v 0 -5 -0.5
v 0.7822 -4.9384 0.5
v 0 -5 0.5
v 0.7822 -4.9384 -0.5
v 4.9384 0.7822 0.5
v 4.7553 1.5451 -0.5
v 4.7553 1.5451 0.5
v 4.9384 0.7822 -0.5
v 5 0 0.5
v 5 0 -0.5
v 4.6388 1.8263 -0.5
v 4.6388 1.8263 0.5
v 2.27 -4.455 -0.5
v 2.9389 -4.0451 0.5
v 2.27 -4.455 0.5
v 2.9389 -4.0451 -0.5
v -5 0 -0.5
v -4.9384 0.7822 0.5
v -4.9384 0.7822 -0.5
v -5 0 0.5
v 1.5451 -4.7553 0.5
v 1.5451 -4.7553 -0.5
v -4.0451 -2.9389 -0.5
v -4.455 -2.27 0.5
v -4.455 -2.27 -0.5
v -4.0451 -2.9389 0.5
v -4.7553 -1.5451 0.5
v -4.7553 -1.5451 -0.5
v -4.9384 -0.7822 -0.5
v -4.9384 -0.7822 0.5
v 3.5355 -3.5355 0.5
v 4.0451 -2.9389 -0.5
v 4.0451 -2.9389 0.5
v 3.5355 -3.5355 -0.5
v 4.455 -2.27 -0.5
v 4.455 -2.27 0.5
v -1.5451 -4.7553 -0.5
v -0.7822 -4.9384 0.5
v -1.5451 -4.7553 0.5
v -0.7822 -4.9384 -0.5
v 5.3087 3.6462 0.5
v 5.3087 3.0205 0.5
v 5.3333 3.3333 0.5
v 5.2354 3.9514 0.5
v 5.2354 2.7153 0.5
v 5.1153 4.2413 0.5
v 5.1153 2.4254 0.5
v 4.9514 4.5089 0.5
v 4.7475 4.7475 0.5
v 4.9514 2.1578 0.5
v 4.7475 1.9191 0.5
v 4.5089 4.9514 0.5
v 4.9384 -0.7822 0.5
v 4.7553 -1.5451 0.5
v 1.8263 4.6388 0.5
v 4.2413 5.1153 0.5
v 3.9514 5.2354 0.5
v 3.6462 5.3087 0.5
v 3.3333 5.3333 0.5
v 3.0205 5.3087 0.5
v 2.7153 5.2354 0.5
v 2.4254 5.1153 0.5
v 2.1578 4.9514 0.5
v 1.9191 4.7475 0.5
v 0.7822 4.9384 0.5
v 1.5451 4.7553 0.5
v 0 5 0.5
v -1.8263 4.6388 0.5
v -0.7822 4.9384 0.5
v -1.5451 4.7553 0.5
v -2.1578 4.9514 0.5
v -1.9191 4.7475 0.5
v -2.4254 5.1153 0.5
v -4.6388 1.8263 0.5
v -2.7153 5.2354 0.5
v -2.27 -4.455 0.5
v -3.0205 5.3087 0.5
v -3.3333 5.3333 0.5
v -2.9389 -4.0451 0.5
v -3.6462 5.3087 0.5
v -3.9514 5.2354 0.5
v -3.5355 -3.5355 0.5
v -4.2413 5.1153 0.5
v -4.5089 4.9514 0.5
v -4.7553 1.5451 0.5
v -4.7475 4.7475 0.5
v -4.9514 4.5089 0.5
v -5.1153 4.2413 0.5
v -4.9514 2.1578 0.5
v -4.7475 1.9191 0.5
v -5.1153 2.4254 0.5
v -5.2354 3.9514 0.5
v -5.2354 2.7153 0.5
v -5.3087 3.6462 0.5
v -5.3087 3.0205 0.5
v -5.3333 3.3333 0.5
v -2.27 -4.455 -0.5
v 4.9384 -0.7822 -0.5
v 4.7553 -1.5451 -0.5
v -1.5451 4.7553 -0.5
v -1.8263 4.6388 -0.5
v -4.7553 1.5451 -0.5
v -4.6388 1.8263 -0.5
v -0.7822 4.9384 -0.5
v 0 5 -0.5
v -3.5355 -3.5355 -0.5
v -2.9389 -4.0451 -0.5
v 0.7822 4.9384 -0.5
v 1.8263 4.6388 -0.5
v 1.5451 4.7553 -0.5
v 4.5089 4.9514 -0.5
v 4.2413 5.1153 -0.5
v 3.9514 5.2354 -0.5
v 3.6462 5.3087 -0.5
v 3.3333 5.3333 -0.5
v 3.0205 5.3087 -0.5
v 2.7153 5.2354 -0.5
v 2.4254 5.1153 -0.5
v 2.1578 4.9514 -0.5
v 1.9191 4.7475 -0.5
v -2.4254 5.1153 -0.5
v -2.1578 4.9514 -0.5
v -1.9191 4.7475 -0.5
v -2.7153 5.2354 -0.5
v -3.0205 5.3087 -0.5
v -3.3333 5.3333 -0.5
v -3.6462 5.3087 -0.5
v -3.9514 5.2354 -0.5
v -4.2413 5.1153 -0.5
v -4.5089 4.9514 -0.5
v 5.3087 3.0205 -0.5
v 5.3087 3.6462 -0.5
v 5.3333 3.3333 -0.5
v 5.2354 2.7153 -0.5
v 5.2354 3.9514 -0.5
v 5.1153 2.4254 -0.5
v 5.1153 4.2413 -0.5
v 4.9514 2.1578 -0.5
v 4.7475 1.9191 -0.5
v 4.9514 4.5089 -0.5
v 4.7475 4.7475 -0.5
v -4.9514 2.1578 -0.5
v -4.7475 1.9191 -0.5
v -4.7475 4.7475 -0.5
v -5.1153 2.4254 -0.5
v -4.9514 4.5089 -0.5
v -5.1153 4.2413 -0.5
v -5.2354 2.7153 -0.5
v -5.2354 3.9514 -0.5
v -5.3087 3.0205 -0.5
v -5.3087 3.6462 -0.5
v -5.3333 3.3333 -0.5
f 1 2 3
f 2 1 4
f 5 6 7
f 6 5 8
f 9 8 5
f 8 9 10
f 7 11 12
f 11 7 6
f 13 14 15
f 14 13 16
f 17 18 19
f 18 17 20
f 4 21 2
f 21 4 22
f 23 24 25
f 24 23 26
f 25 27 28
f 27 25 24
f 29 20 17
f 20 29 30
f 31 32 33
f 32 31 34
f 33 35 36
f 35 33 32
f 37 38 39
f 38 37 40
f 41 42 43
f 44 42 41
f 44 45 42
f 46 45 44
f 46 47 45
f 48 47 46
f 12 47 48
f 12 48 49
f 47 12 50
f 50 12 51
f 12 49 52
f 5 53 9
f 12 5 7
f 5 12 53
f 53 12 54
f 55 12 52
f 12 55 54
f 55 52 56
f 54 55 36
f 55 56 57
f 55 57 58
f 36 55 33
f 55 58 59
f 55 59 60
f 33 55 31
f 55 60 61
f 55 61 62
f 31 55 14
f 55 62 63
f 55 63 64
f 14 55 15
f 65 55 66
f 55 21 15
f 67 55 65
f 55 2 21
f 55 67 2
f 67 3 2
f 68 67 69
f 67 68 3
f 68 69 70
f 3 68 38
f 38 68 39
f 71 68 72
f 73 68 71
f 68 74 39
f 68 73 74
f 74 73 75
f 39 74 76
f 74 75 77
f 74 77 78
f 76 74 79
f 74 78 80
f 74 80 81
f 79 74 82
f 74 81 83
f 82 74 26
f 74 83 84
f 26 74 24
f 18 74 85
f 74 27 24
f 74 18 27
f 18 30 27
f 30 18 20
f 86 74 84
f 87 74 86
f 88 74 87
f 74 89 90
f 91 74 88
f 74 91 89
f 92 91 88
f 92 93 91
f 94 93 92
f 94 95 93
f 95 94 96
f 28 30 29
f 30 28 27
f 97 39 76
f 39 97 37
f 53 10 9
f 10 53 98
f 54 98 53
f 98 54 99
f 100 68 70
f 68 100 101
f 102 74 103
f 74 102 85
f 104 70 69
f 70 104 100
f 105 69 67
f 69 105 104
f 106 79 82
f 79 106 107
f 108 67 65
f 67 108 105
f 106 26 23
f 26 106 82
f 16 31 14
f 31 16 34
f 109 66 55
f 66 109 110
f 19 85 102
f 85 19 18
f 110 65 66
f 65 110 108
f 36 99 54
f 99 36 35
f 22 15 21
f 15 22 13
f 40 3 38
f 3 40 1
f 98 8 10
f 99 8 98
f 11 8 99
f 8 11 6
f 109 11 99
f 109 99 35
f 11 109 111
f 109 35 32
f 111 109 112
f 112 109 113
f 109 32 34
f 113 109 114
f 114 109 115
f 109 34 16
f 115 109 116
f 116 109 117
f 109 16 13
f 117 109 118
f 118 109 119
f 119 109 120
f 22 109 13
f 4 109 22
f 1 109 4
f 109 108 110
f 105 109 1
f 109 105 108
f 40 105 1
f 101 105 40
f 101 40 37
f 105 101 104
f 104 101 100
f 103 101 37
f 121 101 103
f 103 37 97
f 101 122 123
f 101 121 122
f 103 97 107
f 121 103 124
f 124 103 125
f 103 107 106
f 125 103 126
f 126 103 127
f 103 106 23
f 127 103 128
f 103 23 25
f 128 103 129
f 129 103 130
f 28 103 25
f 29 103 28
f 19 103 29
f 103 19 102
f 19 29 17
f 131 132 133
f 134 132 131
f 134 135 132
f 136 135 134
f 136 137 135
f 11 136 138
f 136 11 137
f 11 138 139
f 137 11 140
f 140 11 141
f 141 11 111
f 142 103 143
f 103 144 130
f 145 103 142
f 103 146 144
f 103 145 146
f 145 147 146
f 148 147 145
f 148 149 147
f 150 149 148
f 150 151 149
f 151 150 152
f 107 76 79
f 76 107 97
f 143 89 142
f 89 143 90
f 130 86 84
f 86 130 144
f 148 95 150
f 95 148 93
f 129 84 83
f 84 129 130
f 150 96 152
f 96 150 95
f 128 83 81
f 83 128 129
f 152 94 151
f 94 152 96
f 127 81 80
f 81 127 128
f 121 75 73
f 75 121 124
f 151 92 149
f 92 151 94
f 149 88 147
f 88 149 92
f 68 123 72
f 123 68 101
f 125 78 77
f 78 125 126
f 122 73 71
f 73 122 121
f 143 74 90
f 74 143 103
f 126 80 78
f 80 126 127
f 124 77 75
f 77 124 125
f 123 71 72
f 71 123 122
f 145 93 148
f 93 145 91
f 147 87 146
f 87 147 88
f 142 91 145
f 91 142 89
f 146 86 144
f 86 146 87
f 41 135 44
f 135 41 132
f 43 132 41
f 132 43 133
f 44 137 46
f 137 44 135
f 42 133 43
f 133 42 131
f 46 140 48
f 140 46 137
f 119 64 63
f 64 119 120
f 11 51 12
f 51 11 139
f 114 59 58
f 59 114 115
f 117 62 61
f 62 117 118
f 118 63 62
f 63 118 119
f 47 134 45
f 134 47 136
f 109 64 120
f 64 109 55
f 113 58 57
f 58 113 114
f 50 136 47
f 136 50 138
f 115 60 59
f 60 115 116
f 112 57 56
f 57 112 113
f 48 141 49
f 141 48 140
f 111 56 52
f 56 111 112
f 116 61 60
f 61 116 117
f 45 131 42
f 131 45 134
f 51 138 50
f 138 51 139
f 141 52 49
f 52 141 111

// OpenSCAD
//Author: 
//Date: 
//Description: 2-1 parameterization assignment

$fn = 40;

//Read through the example and change paramets notice how the model grows and retains its over all structure.

//Make a parameterized mickey mouse shape
face_size = 10;
ear_size = 4;
thickness = 1;

cylinder(h = thickness, d = face_size, center = true);
translate([-face_size/3, face_size/3, 0])
cylinder(h = thickness, d = ear_size, center = true);
translate([face_size/3, face_size/3, 0])
cylinder(h = thickness, d = ear_size, center = true);


//PROBLEM
//Choose a model from Lesson 1-0 and 1-1 (top, stair case, yo-yo) and parameterize it. Every parameter you use should have a descriptive name and you should be able to change the whole model correctly by chaning the parameters. 
